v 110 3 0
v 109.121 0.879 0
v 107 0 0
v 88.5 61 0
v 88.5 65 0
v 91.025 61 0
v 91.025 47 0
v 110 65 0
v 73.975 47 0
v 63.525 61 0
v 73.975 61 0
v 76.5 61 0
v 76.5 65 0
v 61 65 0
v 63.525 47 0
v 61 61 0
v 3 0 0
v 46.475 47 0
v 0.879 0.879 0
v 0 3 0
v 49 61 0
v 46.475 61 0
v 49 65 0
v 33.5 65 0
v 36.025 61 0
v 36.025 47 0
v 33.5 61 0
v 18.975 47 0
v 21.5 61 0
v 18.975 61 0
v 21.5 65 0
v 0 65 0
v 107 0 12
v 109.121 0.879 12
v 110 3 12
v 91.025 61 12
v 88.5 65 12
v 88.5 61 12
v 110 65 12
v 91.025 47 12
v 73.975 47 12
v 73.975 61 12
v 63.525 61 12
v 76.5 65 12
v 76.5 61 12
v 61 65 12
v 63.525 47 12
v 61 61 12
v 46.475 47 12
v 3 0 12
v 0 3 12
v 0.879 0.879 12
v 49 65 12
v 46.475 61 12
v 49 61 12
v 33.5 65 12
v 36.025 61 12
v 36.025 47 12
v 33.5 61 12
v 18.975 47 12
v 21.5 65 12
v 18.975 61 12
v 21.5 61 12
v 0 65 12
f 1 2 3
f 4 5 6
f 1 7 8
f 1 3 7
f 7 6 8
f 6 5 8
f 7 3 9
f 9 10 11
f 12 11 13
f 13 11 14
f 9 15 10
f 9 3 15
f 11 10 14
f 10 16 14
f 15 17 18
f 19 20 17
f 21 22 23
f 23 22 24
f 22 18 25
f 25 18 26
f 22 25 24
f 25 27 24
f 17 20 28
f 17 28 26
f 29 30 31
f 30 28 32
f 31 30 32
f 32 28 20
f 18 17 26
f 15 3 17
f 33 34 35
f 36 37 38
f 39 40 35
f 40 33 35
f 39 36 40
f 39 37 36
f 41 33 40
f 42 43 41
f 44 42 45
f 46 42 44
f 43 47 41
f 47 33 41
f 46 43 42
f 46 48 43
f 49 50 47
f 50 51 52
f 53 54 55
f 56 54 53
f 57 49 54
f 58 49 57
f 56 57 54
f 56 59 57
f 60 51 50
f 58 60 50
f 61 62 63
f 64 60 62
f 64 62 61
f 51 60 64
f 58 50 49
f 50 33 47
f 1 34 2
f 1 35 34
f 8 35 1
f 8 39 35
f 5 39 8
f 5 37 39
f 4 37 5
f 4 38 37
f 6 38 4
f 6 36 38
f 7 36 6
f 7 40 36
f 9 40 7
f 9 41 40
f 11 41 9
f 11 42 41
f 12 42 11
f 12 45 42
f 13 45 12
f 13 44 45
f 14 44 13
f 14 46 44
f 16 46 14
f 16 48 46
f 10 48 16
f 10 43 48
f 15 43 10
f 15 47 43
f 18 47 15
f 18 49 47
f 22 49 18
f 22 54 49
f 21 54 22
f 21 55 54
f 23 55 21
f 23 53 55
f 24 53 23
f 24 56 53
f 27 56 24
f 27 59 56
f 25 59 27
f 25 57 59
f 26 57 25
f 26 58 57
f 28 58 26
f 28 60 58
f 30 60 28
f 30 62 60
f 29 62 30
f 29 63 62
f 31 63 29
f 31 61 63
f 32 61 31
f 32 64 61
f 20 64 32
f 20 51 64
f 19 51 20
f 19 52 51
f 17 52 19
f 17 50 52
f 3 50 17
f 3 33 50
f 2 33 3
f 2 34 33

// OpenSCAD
$fn = 32;

// ----------------------------------------------------------------------
// Window plate: 110 x 65 mm, 3 open windows
// ----------------------------------------------------------------------

// --- parameters (mm) ---
profile_height = 12;      // extrusion height
profile_points = 32;      // points of the closed outline

profile = [[0, 3], [0.879, 0.879], [3, 0], [107, 0], [109.121, 0.879], [110, 3], [110, 65], [88.5, 65], [88.5, 61], [91.025, 61], [91.025, 47], [73.975, 47], [73.975, 61], [76.5, 61], [76.5, 65], [61, 65], [61, 61], [63.525, 61], [63.525, 47], [46.475, 47], [46.475, 61], [49, 61], [49, 65], [33.5, 65], [33.5, 61], [36.025, 61], [36.025, 47], [18.975, 47], [18.975, 61], [21.5, 61], [21.5, 65], [0, 65]];  // single closed polygon, 32 points, counter clockwise

// --- the one profile operation ---
linear_extrude(height = profile_height) polygon(points = profile);
